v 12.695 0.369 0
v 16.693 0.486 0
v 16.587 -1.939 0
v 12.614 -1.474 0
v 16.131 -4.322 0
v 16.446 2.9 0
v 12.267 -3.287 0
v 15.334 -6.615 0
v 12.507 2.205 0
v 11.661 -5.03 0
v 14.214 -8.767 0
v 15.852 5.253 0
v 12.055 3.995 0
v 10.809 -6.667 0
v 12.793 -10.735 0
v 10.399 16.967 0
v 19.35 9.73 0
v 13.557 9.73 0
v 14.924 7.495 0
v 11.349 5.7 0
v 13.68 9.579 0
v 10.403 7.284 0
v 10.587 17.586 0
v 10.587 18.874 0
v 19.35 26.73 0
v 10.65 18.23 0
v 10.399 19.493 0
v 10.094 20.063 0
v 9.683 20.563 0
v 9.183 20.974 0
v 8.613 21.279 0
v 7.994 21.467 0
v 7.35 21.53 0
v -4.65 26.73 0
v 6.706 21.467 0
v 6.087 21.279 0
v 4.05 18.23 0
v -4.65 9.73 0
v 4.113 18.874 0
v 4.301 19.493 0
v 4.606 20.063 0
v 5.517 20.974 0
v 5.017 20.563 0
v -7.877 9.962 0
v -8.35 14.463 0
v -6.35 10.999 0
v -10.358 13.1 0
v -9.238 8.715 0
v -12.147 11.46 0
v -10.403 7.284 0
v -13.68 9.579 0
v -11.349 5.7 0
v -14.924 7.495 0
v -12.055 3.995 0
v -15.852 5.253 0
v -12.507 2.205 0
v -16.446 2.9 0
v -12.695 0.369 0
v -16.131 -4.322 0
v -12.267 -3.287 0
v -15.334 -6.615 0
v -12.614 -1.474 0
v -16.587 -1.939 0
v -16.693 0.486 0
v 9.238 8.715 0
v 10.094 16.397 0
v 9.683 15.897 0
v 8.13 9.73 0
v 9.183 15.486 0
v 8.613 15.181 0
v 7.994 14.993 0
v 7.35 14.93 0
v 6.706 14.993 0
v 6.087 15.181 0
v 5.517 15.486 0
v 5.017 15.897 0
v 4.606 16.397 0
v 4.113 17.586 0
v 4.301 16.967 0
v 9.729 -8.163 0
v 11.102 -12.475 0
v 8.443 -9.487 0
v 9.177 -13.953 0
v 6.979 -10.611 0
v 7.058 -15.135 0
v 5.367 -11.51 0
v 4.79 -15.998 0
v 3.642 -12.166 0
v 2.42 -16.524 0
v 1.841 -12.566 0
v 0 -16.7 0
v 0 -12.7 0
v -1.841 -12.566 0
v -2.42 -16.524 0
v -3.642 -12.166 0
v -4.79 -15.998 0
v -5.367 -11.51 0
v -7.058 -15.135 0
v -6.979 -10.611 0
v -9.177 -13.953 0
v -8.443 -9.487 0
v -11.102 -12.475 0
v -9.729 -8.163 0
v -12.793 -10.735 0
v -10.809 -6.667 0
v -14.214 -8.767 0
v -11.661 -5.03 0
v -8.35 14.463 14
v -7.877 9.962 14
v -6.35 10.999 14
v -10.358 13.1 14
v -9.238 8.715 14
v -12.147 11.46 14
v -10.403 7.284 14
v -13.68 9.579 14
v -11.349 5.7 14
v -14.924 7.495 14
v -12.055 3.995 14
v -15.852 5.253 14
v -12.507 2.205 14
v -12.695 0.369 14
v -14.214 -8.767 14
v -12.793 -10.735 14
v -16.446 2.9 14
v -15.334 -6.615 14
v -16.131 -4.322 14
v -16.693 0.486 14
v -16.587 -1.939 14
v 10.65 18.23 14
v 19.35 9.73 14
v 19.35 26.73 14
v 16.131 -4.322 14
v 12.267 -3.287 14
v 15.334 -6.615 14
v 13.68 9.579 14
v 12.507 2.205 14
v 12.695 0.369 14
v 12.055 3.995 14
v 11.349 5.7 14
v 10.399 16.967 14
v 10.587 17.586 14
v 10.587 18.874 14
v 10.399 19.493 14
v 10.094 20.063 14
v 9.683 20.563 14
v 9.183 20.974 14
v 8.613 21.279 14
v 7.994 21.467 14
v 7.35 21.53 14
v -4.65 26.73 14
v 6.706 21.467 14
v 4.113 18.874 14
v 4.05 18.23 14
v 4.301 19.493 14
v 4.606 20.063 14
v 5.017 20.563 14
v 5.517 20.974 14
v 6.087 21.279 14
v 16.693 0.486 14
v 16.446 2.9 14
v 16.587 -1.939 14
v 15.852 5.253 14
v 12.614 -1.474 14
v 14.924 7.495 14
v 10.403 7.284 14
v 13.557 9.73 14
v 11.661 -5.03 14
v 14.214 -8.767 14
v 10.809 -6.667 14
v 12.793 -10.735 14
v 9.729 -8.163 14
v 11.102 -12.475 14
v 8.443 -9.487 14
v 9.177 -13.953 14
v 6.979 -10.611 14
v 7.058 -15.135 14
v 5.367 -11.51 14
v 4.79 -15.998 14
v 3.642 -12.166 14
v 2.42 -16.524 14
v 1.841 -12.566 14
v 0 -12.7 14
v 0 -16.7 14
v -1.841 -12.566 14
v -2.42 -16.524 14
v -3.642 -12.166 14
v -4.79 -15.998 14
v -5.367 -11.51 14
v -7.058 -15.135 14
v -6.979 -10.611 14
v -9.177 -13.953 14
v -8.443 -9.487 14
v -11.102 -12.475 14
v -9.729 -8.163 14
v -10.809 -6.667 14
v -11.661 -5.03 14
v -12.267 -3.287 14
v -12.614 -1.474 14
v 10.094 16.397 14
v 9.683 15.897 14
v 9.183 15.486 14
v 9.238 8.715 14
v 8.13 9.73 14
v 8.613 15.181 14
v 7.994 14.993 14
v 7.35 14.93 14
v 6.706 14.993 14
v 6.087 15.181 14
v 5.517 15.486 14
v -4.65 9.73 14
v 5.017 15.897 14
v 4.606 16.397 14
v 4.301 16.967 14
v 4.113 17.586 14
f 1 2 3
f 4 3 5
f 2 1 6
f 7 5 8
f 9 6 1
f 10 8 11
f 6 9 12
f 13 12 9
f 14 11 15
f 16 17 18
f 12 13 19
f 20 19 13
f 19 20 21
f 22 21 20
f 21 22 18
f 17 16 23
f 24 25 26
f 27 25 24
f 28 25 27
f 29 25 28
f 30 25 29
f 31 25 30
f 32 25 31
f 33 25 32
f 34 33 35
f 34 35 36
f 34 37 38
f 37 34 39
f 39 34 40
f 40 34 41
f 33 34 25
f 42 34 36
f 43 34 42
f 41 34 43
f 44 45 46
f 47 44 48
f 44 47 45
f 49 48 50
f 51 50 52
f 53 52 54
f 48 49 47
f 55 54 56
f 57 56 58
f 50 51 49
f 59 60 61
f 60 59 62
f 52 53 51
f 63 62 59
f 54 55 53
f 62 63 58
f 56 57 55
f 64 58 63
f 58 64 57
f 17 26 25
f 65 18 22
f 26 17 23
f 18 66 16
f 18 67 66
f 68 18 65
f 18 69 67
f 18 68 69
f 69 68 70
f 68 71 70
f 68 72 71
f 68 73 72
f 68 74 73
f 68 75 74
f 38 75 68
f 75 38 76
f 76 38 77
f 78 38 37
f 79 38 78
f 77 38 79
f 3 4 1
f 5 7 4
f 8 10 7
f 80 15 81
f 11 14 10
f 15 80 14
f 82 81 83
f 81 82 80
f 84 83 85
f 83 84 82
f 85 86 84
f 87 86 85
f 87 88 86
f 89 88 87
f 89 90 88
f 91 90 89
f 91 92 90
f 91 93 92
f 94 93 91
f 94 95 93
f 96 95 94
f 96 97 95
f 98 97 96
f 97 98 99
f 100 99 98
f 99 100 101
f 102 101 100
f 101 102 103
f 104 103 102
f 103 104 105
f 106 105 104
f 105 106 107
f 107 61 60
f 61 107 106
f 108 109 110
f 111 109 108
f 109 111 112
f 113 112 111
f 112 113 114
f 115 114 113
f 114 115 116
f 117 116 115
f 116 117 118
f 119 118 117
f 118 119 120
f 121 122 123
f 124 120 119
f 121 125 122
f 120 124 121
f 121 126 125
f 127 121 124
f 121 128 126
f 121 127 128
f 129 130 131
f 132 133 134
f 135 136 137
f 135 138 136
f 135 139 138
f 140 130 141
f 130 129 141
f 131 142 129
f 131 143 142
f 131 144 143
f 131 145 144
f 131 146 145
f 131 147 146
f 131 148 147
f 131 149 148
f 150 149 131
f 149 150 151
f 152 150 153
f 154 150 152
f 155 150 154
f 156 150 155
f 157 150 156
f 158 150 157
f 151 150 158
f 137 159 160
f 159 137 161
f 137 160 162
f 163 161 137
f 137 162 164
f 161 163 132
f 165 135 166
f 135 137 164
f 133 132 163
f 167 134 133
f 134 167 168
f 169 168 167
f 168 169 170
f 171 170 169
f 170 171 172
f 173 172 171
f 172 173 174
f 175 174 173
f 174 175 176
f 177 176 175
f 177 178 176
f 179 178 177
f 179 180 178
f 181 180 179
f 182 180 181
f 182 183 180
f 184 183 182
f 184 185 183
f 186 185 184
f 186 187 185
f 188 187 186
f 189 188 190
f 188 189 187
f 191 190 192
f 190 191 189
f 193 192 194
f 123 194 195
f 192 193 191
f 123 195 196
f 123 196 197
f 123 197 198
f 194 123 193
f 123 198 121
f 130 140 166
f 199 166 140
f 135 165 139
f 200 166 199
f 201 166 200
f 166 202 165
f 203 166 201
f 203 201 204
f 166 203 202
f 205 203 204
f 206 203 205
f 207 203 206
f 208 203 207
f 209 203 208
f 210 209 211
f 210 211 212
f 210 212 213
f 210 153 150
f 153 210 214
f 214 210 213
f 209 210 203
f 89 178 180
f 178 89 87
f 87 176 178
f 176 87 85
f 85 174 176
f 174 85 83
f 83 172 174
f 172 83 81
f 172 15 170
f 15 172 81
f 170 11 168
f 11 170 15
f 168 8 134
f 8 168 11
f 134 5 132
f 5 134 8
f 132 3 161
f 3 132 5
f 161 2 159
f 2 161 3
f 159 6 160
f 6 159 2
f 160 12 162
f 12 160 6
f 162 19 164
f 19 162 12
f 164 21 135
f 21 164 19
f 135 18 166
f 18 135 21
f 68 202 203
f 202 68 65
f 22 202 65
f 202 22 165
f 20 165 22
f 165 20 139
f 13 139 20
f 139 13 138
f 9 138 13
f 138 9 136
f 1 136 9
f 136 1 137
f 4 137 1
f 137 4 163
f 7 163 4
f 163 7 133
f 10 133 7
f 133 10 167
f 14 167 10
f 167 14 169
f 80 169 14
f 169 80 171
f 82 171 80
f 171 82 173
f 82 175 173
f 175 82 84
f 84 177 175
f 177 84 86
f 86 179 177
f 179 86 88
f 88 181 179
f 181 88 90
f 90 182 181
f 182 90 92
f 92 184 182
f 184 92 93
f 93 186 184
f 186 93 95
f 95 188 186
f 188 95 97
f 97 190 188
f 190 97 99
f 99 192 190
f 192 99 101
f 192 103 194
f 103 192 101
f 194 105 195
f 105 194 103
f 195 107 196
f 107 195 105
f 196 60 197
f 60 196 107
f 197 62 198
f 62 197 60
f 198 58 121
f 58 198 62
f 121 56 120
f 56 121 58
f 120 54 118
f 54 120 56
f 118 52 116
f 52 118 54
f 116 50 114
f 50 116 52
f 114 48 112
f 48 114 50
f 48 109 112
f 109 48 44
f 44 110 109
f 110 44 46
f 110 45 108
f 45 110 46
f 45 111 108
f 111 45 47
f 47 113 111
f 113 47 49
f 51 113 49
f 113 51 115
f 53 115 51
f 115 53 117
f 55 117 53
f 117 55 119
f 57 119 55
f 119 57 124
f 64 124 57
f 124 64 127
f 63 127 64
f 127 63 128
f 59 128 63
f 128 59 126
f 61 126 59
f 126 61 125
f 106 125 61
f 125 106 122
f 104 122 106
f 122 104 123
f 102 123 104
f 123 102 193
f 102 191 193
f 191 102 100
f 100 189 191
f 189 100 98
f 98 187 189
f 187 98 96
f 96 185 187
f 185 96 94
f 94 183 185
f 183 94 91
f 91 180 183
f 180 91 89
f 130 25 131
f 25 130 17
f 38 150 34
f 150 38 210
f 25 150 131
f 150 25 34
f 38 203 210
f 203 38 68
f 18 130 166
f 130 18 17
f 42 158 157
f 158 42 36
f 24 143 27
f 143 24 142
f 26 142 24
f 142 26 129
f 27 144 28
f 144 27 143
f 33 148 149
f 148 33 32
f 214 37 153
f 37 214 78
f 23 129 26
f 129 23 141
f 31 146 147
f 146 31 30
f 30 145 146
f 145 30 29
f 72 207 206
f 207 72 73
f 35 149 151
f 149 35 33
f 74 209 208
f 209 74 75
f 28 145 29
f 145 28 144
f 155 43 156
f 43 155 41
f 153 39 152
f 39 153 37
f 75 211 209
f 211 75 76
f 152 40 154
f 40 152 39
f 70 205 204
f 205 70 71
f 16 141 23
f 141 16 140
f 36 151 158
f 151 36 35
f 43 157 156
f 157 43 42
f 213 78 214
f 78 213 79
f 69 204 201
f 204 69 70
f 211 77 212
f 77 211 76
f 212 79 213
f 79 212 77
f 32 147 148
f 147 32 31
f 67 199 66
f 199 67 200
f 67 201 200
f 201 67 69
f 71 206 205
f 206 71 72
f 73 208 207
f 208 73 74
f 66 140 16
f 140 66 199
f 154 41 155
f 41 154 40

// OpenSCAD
$fn = 32;

// ----------------------------------------------------------------------
// Pipe clamp: 33.4 mm ring, 4 mm wall, 14 mm wide
// ----------------------------------------------------------------------

// --- parameters (mm) ---
outer_r = 16.7;           // clamp outside radius
inner_r = 12.7;           // pipe bore radius
band = 4;                 // band thickness
clamp_w = 14;             // clamp width
opening = 60;             // opening angle between the ends
lug_w = 24;               // lug width
lug_len = 17;             // lug length
bolt_d = 6.6;             // bolt hole

clamp_profile = [[-8.35, 14.463], [-10.358, 13.1], [-12.147, 11.46], [-13.68, 9.579], [-14.924, 7.495], [-15.852, 5.253], [-16.446, 2.9], [-16.693, 0.486], [-16.587, -1.939], [-16.131, -4.322], [-15.334, -6.615], [-14.214, -8.767], [-12.793, -10.735], [-11.102, -12.475], [-9.177, -13.953], [-7.058, -15.135], [-4.79, -15.998], [-2.42, -16.524], [0, -16.7], [2.42, -16.524], [4.79, -15.998], [7.058, -15.135], [9.177, -13.953], [11.102, -12.475], [12.793, -10.735], [14.214, -8.767], [15.334, -6.615], [16.131, -4.322], [16.587, -1.939], [16.693, 0.486], [16.446, 2.9], [15.852, 5.253], [14.924, 7.495], [13.68, 9.579], [12.147, 11.46], [10.358, 13.1], [8.35, 14.463], [6.35, 10.999], [7.877, 9.962], [9.238, 8.715], [10.403, 7.284], [11.349, 5.7], [12.055, 3.995], [12.507, 2.205], [12.695, 0.369], [12.614, -1.474], [12.267, -3.287], [11.661, -5.03], [10.809, -6.667], [9.729, -8.163], [8.443, -9.487], [6.979, -10.611], [5.367, -11.51], [3.642, -12.166], [1.841, -12.566], [0, -12.7], [-1.841, -12.566], [-3.642, -12.166], [-5.367, -11.51], [-6.979, -10.611], [-8.443, -9.487], [-9.729, -8.163], [-10.809, -6.667], [-11.661, -5.03], [-12.267, -3.287], [-12.614, -1.474], [-12.695, 0.369], [-12.507, 2.205], [-12.055, 3.995], [-11.349, 5.7], [-10.403, 7.284], [-9.238, 8.715], [-7.877, 9.962], [-6.35, 10.999]];

difference() {
  union() {
    linear_extrude(height = clamp_w) polygon(clamp_profile);
    /* bolt lug on the other end */
    translate([-4.65, 9.73, 0]) cube([lug_w, 17, clamp_w]);
  }
  translate([7.35, 18.23, -2.5]) cylinder(h = clamp_w + 5, d = bolt_d);
}
